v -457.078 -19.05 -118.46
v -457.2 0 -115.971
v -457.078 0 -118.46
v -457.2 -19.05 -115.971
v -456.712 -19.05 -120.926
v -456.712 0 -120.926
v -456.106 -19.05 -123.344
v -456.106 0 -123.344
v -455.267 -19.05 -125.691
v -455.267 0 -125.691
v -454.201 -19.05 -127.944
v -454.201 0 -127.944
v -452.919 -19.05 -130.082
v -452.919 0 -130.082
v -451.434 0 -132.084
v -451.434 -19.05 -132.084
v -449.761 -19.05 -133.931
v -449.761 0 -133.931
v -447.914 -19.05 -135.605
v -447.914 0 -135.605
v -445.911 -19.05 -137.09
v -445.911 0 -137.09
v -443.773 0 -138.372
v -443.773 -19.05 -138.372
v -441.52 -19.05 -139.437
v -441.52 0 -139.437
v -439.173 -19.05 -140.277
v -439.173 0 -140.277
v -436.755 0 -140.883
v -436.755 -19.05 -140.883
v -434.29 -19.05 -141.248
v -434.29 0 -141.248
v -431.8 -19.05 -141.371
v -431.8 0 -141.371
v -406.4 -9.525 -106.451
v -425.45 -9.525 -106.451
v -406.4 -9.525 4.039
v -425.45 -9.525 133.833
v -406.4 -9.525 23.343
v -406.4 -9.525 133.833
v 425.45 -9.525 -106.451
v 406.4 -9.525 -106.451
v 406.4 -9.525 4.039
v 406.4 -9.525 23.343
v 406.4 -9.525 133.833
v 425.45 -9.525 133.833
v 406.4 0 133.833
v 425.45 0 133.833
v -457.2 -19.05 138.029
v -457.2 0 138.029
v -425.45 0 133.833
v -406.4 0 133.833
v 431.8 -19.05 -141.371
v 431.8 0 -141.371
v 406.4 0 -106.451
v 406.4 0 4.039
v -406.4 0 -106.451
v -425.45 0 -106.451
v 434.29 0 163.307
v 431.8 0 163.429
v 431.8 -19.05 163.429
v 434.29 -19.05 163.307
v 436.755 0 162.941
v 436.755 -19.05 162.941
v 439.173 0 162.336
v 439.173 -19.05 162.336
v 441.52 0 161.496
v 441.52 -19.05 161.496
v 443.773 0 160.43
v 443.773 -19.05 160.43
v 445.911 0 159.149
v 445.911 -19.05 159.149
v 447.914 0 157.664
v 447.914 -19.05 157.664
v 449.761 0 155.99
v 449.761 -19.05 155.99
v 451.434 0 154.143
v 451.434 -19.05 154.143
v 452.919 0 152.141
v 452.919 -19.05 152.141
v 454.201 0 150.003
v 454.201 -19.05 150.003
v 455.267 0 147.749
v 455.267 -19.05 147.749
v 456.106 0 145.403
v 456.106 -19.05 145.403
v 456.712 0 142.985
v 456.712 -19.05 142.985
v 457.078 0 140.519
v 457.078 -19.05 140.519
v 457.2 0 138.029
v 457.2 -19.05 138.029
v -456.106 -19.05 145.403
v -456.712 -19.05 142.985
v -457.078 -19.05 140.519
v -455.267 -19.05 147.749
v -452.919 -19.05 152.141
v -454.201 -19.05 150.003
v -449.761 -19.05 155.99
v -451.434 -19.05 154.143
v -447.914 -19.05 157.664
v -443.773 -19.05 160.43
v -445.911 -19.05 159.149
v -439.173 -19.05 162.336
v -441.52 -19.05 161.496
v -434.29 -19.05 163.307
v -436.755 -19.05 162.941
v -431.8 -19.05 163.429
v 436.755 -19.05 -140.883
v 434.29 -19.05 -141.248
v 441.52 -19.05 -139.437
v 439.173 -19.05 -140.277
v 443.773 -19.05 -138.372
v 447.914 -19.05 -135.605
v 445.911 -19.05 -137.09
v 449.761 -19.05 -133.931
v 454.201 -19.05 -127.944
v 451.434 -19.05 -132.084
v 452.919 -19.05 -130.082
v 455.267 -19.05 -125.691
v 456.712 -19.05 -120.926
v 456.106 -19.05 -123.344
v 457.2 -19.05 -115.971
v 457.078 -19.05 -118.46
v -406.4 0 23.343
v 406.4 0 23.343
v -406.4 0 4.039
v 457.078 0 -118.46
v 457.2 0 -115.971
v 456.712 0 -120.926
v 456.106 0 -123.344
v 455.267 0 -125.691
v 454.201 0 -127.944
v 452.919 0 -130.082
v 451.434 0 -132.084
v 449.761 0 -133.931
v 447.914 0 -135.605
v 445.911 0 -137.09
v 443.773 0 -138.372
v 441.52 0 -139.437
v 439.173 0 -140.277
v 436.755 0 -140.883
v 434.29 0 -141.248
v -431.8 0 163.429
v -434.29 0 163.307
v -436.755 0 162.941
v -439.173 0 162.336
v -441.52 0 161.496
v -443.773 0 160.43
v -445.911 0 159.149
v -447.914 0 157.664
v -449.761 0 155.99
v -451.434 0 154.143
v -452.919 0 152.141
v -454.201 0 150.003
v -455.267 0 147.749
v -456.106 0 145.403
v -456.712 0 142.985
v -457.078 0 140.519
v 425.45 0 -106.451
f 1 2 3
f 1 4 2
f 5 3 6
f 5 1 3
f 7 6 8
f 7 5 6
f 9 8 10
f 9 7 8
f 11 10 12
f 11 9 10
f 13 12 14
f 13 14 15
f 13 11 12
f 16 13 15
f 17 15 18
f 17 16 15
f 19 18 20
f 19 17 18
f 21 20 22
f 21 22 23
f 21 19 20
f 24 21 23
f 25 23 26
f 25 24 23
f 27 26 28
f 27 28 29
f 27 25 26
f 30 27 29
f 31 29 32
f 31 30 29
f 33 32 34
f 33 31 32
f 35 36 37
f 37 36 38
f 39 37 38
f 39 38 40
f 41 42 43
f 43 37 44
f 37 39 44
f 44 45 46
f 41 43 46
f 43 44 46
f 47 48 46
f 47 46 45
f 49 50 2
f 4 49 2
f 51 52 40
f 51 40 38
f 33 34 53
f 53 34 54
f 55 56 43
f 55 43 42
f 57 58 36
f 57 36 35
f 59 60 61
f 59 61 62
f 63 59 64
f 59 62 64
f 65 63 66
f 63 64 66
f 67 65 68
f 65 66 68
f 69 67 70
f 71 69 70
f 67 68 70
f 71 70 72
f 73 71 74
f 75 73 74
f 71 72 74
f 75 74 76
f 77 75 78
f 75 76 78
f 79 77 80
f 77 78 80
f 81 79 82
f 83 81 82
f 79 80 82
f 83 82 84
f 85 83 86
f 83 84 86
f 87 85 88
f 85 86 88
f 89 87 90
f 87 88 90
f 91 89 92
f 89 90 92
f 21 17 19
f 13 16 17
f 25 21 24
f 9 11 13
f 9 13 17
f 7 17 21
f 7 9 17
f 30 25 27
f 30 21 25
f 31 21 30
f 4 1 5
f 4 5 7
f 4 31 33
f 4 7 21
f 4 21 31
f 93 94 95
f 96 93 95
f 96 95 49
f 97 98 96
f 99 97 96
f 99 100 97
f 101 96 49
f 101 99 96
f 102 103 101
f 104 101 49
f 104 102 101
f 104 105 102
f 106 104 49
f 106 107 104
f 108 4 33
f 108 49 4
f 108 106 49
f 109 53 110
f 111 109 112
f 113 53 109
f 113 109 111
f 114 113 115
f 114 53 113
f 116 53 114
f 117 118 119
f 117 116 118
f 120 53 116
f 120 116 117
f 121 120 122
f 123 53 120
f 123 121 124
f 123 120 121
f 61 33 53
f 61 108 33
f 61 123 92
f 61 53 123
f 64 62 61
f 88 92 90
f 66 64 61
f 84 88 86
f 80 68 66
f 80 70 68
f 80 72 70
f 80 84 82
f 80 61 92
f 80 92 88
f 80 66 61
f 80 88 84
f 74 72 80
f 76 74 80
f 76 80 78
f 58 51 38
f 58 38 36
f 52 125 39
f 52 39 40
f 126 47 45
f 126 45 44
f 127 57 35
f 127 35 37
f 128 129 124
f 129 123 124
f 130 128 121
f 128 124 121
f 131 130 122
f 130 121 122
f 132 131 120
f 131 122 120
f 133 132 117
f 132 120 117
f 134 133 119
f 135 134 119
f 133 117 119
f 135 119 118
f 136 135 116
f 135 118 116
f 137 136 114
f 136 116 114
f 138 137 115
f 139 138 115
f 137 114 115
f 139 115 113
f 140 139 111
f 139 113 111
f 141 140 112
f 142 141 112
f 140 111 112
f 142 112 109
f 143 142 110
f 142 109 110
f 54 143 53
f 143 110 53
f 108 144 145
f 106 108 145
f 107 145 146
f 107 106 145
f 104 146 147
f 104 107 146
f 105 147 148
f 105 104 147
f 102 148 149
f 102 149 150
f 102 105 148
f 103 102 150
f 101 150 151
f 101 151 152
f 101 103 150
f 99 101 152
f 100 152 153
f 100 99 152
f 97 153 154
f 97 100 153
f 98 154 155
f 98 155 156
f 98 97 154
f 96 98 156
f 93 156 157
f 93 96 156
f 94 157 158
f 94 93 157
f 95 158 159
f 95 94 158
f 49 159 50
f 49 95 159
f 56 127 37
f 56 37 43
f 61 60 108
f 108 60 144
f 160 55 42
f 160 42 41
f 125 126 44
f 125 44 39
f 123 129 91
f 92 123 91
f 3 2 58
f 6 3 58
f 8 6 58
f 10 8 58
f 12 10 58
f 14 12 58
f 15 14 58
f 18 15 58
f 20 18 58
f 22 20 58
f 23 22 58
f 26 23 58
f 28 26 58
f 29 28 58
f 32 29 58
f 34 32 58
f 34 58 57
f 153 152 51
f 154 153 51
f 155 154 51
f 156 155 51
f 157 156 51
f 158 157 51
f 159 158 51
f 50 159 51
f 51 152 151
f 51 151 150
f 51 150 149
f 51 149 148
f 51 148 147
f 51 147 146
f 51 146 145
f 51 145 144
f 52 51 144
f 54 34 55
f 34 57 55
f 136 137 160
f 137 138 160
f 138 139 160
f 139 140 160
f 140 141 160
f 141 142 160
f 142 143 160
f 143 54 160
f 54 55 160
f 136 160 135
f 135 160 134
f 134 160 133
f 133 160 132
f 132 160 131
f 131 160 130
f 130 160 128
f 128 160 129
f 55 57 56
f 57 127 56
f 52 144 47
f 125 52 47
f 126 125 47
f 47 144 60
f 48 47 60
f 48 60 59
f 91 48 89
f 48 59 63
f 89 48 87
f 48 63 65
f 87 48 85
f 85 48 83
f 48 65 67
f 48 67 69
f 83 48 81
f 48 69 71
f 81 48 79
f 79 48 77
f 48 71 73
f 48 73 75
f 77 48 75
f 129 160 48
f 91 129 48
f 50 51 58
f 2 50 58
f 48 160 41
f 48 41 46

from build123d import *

# Parameters (mm, degrees)
F1_DEPTH = 19.05
F3_DEPTH = 9.525
F4_R     = 25.4
F5_R     = 25.4
F6_R     = 25.4
F7_R     = 25.4


# Not quite as in the source:
# - a length typed as a fraction of an inch, garbled in the dataset ("3 / 203.2 mm" for 3/8 in), is restored


with BuildPart() as f1:
    # F0 (on Front) → F1 (new body)
    with BuildSketch(Plane.XZ):
        Polygon((457.2, 163.4292998382), (0, 163.4292998382), (-457.2, 163.4292998382), (-457.2, -141.3707001618), (0, -141.3707001618), (457.2, -141.3707001618), align=None)
    extrude(amount=F1_DEPTH)

    # F2 (on Front) → F3 (cut)
    with BuildSketch(Plane.XZ):
        Polygon((425.45, -106.4507083202), (425.45, 13.6912916798), (425.45, 133.8332916798), (406.4, 133.8332916798), (406.4, 23.3432916798), (406.4, 13.6912916798), (406.4, 4.0392916798), (406.4, -106.4507083202), align=None)
        Polygon((406.4, 13.6912916798), (406.4, 23.3432916798), (-406.4, 23.3432916798), (-406.4, 13.6912916798), (-406.4, 4.0392916798), (406.4, 4.0392916798), align=None)
        Polygon((-406.4, 13.6912916798), (-406.4, 23.3432916798), (-406.4, 133.8332916798), (-425.45, 133.8332916798), (-425.45, 13.6912916798), (-425.45, -106.4507083202), (-406.4, -106.4507083202), (-406.4, 4.0392916798), align=None)
    extrude(amount=F3_DEPTH, mode=Mode.SUBTRACT)

    # F4
    f4_edges = [f1.edges().sort_by_distance(p)[0] for p in [
        (457.2, -9.525, 163.4293),
    ]]
    fillet(f4_edges, radius=F4_R)

    # F5
    f5_edges = [f1.edges().sort_by_distance(p)[0] for p in [
        (457.2, -9.525, -141.3707),
    ]]
    fillet(f5_edges, radius=F5_R)

    # F6
    f6_edges = [f1.edges().sort_by_distance(p)[0] for p in [
        (-457.2, -9.525, 163.4293),
    ]]
    fillet(f6_edges, radius=F6_R)

    # F7
    f7_edges = [f1.edges().sort_by_distance(p)[0] for p in [
        (-457.2, -9.525, -141.3707),
    ]]
    fillet(f7_edges, radius=F7_R)


solid = f1.part
